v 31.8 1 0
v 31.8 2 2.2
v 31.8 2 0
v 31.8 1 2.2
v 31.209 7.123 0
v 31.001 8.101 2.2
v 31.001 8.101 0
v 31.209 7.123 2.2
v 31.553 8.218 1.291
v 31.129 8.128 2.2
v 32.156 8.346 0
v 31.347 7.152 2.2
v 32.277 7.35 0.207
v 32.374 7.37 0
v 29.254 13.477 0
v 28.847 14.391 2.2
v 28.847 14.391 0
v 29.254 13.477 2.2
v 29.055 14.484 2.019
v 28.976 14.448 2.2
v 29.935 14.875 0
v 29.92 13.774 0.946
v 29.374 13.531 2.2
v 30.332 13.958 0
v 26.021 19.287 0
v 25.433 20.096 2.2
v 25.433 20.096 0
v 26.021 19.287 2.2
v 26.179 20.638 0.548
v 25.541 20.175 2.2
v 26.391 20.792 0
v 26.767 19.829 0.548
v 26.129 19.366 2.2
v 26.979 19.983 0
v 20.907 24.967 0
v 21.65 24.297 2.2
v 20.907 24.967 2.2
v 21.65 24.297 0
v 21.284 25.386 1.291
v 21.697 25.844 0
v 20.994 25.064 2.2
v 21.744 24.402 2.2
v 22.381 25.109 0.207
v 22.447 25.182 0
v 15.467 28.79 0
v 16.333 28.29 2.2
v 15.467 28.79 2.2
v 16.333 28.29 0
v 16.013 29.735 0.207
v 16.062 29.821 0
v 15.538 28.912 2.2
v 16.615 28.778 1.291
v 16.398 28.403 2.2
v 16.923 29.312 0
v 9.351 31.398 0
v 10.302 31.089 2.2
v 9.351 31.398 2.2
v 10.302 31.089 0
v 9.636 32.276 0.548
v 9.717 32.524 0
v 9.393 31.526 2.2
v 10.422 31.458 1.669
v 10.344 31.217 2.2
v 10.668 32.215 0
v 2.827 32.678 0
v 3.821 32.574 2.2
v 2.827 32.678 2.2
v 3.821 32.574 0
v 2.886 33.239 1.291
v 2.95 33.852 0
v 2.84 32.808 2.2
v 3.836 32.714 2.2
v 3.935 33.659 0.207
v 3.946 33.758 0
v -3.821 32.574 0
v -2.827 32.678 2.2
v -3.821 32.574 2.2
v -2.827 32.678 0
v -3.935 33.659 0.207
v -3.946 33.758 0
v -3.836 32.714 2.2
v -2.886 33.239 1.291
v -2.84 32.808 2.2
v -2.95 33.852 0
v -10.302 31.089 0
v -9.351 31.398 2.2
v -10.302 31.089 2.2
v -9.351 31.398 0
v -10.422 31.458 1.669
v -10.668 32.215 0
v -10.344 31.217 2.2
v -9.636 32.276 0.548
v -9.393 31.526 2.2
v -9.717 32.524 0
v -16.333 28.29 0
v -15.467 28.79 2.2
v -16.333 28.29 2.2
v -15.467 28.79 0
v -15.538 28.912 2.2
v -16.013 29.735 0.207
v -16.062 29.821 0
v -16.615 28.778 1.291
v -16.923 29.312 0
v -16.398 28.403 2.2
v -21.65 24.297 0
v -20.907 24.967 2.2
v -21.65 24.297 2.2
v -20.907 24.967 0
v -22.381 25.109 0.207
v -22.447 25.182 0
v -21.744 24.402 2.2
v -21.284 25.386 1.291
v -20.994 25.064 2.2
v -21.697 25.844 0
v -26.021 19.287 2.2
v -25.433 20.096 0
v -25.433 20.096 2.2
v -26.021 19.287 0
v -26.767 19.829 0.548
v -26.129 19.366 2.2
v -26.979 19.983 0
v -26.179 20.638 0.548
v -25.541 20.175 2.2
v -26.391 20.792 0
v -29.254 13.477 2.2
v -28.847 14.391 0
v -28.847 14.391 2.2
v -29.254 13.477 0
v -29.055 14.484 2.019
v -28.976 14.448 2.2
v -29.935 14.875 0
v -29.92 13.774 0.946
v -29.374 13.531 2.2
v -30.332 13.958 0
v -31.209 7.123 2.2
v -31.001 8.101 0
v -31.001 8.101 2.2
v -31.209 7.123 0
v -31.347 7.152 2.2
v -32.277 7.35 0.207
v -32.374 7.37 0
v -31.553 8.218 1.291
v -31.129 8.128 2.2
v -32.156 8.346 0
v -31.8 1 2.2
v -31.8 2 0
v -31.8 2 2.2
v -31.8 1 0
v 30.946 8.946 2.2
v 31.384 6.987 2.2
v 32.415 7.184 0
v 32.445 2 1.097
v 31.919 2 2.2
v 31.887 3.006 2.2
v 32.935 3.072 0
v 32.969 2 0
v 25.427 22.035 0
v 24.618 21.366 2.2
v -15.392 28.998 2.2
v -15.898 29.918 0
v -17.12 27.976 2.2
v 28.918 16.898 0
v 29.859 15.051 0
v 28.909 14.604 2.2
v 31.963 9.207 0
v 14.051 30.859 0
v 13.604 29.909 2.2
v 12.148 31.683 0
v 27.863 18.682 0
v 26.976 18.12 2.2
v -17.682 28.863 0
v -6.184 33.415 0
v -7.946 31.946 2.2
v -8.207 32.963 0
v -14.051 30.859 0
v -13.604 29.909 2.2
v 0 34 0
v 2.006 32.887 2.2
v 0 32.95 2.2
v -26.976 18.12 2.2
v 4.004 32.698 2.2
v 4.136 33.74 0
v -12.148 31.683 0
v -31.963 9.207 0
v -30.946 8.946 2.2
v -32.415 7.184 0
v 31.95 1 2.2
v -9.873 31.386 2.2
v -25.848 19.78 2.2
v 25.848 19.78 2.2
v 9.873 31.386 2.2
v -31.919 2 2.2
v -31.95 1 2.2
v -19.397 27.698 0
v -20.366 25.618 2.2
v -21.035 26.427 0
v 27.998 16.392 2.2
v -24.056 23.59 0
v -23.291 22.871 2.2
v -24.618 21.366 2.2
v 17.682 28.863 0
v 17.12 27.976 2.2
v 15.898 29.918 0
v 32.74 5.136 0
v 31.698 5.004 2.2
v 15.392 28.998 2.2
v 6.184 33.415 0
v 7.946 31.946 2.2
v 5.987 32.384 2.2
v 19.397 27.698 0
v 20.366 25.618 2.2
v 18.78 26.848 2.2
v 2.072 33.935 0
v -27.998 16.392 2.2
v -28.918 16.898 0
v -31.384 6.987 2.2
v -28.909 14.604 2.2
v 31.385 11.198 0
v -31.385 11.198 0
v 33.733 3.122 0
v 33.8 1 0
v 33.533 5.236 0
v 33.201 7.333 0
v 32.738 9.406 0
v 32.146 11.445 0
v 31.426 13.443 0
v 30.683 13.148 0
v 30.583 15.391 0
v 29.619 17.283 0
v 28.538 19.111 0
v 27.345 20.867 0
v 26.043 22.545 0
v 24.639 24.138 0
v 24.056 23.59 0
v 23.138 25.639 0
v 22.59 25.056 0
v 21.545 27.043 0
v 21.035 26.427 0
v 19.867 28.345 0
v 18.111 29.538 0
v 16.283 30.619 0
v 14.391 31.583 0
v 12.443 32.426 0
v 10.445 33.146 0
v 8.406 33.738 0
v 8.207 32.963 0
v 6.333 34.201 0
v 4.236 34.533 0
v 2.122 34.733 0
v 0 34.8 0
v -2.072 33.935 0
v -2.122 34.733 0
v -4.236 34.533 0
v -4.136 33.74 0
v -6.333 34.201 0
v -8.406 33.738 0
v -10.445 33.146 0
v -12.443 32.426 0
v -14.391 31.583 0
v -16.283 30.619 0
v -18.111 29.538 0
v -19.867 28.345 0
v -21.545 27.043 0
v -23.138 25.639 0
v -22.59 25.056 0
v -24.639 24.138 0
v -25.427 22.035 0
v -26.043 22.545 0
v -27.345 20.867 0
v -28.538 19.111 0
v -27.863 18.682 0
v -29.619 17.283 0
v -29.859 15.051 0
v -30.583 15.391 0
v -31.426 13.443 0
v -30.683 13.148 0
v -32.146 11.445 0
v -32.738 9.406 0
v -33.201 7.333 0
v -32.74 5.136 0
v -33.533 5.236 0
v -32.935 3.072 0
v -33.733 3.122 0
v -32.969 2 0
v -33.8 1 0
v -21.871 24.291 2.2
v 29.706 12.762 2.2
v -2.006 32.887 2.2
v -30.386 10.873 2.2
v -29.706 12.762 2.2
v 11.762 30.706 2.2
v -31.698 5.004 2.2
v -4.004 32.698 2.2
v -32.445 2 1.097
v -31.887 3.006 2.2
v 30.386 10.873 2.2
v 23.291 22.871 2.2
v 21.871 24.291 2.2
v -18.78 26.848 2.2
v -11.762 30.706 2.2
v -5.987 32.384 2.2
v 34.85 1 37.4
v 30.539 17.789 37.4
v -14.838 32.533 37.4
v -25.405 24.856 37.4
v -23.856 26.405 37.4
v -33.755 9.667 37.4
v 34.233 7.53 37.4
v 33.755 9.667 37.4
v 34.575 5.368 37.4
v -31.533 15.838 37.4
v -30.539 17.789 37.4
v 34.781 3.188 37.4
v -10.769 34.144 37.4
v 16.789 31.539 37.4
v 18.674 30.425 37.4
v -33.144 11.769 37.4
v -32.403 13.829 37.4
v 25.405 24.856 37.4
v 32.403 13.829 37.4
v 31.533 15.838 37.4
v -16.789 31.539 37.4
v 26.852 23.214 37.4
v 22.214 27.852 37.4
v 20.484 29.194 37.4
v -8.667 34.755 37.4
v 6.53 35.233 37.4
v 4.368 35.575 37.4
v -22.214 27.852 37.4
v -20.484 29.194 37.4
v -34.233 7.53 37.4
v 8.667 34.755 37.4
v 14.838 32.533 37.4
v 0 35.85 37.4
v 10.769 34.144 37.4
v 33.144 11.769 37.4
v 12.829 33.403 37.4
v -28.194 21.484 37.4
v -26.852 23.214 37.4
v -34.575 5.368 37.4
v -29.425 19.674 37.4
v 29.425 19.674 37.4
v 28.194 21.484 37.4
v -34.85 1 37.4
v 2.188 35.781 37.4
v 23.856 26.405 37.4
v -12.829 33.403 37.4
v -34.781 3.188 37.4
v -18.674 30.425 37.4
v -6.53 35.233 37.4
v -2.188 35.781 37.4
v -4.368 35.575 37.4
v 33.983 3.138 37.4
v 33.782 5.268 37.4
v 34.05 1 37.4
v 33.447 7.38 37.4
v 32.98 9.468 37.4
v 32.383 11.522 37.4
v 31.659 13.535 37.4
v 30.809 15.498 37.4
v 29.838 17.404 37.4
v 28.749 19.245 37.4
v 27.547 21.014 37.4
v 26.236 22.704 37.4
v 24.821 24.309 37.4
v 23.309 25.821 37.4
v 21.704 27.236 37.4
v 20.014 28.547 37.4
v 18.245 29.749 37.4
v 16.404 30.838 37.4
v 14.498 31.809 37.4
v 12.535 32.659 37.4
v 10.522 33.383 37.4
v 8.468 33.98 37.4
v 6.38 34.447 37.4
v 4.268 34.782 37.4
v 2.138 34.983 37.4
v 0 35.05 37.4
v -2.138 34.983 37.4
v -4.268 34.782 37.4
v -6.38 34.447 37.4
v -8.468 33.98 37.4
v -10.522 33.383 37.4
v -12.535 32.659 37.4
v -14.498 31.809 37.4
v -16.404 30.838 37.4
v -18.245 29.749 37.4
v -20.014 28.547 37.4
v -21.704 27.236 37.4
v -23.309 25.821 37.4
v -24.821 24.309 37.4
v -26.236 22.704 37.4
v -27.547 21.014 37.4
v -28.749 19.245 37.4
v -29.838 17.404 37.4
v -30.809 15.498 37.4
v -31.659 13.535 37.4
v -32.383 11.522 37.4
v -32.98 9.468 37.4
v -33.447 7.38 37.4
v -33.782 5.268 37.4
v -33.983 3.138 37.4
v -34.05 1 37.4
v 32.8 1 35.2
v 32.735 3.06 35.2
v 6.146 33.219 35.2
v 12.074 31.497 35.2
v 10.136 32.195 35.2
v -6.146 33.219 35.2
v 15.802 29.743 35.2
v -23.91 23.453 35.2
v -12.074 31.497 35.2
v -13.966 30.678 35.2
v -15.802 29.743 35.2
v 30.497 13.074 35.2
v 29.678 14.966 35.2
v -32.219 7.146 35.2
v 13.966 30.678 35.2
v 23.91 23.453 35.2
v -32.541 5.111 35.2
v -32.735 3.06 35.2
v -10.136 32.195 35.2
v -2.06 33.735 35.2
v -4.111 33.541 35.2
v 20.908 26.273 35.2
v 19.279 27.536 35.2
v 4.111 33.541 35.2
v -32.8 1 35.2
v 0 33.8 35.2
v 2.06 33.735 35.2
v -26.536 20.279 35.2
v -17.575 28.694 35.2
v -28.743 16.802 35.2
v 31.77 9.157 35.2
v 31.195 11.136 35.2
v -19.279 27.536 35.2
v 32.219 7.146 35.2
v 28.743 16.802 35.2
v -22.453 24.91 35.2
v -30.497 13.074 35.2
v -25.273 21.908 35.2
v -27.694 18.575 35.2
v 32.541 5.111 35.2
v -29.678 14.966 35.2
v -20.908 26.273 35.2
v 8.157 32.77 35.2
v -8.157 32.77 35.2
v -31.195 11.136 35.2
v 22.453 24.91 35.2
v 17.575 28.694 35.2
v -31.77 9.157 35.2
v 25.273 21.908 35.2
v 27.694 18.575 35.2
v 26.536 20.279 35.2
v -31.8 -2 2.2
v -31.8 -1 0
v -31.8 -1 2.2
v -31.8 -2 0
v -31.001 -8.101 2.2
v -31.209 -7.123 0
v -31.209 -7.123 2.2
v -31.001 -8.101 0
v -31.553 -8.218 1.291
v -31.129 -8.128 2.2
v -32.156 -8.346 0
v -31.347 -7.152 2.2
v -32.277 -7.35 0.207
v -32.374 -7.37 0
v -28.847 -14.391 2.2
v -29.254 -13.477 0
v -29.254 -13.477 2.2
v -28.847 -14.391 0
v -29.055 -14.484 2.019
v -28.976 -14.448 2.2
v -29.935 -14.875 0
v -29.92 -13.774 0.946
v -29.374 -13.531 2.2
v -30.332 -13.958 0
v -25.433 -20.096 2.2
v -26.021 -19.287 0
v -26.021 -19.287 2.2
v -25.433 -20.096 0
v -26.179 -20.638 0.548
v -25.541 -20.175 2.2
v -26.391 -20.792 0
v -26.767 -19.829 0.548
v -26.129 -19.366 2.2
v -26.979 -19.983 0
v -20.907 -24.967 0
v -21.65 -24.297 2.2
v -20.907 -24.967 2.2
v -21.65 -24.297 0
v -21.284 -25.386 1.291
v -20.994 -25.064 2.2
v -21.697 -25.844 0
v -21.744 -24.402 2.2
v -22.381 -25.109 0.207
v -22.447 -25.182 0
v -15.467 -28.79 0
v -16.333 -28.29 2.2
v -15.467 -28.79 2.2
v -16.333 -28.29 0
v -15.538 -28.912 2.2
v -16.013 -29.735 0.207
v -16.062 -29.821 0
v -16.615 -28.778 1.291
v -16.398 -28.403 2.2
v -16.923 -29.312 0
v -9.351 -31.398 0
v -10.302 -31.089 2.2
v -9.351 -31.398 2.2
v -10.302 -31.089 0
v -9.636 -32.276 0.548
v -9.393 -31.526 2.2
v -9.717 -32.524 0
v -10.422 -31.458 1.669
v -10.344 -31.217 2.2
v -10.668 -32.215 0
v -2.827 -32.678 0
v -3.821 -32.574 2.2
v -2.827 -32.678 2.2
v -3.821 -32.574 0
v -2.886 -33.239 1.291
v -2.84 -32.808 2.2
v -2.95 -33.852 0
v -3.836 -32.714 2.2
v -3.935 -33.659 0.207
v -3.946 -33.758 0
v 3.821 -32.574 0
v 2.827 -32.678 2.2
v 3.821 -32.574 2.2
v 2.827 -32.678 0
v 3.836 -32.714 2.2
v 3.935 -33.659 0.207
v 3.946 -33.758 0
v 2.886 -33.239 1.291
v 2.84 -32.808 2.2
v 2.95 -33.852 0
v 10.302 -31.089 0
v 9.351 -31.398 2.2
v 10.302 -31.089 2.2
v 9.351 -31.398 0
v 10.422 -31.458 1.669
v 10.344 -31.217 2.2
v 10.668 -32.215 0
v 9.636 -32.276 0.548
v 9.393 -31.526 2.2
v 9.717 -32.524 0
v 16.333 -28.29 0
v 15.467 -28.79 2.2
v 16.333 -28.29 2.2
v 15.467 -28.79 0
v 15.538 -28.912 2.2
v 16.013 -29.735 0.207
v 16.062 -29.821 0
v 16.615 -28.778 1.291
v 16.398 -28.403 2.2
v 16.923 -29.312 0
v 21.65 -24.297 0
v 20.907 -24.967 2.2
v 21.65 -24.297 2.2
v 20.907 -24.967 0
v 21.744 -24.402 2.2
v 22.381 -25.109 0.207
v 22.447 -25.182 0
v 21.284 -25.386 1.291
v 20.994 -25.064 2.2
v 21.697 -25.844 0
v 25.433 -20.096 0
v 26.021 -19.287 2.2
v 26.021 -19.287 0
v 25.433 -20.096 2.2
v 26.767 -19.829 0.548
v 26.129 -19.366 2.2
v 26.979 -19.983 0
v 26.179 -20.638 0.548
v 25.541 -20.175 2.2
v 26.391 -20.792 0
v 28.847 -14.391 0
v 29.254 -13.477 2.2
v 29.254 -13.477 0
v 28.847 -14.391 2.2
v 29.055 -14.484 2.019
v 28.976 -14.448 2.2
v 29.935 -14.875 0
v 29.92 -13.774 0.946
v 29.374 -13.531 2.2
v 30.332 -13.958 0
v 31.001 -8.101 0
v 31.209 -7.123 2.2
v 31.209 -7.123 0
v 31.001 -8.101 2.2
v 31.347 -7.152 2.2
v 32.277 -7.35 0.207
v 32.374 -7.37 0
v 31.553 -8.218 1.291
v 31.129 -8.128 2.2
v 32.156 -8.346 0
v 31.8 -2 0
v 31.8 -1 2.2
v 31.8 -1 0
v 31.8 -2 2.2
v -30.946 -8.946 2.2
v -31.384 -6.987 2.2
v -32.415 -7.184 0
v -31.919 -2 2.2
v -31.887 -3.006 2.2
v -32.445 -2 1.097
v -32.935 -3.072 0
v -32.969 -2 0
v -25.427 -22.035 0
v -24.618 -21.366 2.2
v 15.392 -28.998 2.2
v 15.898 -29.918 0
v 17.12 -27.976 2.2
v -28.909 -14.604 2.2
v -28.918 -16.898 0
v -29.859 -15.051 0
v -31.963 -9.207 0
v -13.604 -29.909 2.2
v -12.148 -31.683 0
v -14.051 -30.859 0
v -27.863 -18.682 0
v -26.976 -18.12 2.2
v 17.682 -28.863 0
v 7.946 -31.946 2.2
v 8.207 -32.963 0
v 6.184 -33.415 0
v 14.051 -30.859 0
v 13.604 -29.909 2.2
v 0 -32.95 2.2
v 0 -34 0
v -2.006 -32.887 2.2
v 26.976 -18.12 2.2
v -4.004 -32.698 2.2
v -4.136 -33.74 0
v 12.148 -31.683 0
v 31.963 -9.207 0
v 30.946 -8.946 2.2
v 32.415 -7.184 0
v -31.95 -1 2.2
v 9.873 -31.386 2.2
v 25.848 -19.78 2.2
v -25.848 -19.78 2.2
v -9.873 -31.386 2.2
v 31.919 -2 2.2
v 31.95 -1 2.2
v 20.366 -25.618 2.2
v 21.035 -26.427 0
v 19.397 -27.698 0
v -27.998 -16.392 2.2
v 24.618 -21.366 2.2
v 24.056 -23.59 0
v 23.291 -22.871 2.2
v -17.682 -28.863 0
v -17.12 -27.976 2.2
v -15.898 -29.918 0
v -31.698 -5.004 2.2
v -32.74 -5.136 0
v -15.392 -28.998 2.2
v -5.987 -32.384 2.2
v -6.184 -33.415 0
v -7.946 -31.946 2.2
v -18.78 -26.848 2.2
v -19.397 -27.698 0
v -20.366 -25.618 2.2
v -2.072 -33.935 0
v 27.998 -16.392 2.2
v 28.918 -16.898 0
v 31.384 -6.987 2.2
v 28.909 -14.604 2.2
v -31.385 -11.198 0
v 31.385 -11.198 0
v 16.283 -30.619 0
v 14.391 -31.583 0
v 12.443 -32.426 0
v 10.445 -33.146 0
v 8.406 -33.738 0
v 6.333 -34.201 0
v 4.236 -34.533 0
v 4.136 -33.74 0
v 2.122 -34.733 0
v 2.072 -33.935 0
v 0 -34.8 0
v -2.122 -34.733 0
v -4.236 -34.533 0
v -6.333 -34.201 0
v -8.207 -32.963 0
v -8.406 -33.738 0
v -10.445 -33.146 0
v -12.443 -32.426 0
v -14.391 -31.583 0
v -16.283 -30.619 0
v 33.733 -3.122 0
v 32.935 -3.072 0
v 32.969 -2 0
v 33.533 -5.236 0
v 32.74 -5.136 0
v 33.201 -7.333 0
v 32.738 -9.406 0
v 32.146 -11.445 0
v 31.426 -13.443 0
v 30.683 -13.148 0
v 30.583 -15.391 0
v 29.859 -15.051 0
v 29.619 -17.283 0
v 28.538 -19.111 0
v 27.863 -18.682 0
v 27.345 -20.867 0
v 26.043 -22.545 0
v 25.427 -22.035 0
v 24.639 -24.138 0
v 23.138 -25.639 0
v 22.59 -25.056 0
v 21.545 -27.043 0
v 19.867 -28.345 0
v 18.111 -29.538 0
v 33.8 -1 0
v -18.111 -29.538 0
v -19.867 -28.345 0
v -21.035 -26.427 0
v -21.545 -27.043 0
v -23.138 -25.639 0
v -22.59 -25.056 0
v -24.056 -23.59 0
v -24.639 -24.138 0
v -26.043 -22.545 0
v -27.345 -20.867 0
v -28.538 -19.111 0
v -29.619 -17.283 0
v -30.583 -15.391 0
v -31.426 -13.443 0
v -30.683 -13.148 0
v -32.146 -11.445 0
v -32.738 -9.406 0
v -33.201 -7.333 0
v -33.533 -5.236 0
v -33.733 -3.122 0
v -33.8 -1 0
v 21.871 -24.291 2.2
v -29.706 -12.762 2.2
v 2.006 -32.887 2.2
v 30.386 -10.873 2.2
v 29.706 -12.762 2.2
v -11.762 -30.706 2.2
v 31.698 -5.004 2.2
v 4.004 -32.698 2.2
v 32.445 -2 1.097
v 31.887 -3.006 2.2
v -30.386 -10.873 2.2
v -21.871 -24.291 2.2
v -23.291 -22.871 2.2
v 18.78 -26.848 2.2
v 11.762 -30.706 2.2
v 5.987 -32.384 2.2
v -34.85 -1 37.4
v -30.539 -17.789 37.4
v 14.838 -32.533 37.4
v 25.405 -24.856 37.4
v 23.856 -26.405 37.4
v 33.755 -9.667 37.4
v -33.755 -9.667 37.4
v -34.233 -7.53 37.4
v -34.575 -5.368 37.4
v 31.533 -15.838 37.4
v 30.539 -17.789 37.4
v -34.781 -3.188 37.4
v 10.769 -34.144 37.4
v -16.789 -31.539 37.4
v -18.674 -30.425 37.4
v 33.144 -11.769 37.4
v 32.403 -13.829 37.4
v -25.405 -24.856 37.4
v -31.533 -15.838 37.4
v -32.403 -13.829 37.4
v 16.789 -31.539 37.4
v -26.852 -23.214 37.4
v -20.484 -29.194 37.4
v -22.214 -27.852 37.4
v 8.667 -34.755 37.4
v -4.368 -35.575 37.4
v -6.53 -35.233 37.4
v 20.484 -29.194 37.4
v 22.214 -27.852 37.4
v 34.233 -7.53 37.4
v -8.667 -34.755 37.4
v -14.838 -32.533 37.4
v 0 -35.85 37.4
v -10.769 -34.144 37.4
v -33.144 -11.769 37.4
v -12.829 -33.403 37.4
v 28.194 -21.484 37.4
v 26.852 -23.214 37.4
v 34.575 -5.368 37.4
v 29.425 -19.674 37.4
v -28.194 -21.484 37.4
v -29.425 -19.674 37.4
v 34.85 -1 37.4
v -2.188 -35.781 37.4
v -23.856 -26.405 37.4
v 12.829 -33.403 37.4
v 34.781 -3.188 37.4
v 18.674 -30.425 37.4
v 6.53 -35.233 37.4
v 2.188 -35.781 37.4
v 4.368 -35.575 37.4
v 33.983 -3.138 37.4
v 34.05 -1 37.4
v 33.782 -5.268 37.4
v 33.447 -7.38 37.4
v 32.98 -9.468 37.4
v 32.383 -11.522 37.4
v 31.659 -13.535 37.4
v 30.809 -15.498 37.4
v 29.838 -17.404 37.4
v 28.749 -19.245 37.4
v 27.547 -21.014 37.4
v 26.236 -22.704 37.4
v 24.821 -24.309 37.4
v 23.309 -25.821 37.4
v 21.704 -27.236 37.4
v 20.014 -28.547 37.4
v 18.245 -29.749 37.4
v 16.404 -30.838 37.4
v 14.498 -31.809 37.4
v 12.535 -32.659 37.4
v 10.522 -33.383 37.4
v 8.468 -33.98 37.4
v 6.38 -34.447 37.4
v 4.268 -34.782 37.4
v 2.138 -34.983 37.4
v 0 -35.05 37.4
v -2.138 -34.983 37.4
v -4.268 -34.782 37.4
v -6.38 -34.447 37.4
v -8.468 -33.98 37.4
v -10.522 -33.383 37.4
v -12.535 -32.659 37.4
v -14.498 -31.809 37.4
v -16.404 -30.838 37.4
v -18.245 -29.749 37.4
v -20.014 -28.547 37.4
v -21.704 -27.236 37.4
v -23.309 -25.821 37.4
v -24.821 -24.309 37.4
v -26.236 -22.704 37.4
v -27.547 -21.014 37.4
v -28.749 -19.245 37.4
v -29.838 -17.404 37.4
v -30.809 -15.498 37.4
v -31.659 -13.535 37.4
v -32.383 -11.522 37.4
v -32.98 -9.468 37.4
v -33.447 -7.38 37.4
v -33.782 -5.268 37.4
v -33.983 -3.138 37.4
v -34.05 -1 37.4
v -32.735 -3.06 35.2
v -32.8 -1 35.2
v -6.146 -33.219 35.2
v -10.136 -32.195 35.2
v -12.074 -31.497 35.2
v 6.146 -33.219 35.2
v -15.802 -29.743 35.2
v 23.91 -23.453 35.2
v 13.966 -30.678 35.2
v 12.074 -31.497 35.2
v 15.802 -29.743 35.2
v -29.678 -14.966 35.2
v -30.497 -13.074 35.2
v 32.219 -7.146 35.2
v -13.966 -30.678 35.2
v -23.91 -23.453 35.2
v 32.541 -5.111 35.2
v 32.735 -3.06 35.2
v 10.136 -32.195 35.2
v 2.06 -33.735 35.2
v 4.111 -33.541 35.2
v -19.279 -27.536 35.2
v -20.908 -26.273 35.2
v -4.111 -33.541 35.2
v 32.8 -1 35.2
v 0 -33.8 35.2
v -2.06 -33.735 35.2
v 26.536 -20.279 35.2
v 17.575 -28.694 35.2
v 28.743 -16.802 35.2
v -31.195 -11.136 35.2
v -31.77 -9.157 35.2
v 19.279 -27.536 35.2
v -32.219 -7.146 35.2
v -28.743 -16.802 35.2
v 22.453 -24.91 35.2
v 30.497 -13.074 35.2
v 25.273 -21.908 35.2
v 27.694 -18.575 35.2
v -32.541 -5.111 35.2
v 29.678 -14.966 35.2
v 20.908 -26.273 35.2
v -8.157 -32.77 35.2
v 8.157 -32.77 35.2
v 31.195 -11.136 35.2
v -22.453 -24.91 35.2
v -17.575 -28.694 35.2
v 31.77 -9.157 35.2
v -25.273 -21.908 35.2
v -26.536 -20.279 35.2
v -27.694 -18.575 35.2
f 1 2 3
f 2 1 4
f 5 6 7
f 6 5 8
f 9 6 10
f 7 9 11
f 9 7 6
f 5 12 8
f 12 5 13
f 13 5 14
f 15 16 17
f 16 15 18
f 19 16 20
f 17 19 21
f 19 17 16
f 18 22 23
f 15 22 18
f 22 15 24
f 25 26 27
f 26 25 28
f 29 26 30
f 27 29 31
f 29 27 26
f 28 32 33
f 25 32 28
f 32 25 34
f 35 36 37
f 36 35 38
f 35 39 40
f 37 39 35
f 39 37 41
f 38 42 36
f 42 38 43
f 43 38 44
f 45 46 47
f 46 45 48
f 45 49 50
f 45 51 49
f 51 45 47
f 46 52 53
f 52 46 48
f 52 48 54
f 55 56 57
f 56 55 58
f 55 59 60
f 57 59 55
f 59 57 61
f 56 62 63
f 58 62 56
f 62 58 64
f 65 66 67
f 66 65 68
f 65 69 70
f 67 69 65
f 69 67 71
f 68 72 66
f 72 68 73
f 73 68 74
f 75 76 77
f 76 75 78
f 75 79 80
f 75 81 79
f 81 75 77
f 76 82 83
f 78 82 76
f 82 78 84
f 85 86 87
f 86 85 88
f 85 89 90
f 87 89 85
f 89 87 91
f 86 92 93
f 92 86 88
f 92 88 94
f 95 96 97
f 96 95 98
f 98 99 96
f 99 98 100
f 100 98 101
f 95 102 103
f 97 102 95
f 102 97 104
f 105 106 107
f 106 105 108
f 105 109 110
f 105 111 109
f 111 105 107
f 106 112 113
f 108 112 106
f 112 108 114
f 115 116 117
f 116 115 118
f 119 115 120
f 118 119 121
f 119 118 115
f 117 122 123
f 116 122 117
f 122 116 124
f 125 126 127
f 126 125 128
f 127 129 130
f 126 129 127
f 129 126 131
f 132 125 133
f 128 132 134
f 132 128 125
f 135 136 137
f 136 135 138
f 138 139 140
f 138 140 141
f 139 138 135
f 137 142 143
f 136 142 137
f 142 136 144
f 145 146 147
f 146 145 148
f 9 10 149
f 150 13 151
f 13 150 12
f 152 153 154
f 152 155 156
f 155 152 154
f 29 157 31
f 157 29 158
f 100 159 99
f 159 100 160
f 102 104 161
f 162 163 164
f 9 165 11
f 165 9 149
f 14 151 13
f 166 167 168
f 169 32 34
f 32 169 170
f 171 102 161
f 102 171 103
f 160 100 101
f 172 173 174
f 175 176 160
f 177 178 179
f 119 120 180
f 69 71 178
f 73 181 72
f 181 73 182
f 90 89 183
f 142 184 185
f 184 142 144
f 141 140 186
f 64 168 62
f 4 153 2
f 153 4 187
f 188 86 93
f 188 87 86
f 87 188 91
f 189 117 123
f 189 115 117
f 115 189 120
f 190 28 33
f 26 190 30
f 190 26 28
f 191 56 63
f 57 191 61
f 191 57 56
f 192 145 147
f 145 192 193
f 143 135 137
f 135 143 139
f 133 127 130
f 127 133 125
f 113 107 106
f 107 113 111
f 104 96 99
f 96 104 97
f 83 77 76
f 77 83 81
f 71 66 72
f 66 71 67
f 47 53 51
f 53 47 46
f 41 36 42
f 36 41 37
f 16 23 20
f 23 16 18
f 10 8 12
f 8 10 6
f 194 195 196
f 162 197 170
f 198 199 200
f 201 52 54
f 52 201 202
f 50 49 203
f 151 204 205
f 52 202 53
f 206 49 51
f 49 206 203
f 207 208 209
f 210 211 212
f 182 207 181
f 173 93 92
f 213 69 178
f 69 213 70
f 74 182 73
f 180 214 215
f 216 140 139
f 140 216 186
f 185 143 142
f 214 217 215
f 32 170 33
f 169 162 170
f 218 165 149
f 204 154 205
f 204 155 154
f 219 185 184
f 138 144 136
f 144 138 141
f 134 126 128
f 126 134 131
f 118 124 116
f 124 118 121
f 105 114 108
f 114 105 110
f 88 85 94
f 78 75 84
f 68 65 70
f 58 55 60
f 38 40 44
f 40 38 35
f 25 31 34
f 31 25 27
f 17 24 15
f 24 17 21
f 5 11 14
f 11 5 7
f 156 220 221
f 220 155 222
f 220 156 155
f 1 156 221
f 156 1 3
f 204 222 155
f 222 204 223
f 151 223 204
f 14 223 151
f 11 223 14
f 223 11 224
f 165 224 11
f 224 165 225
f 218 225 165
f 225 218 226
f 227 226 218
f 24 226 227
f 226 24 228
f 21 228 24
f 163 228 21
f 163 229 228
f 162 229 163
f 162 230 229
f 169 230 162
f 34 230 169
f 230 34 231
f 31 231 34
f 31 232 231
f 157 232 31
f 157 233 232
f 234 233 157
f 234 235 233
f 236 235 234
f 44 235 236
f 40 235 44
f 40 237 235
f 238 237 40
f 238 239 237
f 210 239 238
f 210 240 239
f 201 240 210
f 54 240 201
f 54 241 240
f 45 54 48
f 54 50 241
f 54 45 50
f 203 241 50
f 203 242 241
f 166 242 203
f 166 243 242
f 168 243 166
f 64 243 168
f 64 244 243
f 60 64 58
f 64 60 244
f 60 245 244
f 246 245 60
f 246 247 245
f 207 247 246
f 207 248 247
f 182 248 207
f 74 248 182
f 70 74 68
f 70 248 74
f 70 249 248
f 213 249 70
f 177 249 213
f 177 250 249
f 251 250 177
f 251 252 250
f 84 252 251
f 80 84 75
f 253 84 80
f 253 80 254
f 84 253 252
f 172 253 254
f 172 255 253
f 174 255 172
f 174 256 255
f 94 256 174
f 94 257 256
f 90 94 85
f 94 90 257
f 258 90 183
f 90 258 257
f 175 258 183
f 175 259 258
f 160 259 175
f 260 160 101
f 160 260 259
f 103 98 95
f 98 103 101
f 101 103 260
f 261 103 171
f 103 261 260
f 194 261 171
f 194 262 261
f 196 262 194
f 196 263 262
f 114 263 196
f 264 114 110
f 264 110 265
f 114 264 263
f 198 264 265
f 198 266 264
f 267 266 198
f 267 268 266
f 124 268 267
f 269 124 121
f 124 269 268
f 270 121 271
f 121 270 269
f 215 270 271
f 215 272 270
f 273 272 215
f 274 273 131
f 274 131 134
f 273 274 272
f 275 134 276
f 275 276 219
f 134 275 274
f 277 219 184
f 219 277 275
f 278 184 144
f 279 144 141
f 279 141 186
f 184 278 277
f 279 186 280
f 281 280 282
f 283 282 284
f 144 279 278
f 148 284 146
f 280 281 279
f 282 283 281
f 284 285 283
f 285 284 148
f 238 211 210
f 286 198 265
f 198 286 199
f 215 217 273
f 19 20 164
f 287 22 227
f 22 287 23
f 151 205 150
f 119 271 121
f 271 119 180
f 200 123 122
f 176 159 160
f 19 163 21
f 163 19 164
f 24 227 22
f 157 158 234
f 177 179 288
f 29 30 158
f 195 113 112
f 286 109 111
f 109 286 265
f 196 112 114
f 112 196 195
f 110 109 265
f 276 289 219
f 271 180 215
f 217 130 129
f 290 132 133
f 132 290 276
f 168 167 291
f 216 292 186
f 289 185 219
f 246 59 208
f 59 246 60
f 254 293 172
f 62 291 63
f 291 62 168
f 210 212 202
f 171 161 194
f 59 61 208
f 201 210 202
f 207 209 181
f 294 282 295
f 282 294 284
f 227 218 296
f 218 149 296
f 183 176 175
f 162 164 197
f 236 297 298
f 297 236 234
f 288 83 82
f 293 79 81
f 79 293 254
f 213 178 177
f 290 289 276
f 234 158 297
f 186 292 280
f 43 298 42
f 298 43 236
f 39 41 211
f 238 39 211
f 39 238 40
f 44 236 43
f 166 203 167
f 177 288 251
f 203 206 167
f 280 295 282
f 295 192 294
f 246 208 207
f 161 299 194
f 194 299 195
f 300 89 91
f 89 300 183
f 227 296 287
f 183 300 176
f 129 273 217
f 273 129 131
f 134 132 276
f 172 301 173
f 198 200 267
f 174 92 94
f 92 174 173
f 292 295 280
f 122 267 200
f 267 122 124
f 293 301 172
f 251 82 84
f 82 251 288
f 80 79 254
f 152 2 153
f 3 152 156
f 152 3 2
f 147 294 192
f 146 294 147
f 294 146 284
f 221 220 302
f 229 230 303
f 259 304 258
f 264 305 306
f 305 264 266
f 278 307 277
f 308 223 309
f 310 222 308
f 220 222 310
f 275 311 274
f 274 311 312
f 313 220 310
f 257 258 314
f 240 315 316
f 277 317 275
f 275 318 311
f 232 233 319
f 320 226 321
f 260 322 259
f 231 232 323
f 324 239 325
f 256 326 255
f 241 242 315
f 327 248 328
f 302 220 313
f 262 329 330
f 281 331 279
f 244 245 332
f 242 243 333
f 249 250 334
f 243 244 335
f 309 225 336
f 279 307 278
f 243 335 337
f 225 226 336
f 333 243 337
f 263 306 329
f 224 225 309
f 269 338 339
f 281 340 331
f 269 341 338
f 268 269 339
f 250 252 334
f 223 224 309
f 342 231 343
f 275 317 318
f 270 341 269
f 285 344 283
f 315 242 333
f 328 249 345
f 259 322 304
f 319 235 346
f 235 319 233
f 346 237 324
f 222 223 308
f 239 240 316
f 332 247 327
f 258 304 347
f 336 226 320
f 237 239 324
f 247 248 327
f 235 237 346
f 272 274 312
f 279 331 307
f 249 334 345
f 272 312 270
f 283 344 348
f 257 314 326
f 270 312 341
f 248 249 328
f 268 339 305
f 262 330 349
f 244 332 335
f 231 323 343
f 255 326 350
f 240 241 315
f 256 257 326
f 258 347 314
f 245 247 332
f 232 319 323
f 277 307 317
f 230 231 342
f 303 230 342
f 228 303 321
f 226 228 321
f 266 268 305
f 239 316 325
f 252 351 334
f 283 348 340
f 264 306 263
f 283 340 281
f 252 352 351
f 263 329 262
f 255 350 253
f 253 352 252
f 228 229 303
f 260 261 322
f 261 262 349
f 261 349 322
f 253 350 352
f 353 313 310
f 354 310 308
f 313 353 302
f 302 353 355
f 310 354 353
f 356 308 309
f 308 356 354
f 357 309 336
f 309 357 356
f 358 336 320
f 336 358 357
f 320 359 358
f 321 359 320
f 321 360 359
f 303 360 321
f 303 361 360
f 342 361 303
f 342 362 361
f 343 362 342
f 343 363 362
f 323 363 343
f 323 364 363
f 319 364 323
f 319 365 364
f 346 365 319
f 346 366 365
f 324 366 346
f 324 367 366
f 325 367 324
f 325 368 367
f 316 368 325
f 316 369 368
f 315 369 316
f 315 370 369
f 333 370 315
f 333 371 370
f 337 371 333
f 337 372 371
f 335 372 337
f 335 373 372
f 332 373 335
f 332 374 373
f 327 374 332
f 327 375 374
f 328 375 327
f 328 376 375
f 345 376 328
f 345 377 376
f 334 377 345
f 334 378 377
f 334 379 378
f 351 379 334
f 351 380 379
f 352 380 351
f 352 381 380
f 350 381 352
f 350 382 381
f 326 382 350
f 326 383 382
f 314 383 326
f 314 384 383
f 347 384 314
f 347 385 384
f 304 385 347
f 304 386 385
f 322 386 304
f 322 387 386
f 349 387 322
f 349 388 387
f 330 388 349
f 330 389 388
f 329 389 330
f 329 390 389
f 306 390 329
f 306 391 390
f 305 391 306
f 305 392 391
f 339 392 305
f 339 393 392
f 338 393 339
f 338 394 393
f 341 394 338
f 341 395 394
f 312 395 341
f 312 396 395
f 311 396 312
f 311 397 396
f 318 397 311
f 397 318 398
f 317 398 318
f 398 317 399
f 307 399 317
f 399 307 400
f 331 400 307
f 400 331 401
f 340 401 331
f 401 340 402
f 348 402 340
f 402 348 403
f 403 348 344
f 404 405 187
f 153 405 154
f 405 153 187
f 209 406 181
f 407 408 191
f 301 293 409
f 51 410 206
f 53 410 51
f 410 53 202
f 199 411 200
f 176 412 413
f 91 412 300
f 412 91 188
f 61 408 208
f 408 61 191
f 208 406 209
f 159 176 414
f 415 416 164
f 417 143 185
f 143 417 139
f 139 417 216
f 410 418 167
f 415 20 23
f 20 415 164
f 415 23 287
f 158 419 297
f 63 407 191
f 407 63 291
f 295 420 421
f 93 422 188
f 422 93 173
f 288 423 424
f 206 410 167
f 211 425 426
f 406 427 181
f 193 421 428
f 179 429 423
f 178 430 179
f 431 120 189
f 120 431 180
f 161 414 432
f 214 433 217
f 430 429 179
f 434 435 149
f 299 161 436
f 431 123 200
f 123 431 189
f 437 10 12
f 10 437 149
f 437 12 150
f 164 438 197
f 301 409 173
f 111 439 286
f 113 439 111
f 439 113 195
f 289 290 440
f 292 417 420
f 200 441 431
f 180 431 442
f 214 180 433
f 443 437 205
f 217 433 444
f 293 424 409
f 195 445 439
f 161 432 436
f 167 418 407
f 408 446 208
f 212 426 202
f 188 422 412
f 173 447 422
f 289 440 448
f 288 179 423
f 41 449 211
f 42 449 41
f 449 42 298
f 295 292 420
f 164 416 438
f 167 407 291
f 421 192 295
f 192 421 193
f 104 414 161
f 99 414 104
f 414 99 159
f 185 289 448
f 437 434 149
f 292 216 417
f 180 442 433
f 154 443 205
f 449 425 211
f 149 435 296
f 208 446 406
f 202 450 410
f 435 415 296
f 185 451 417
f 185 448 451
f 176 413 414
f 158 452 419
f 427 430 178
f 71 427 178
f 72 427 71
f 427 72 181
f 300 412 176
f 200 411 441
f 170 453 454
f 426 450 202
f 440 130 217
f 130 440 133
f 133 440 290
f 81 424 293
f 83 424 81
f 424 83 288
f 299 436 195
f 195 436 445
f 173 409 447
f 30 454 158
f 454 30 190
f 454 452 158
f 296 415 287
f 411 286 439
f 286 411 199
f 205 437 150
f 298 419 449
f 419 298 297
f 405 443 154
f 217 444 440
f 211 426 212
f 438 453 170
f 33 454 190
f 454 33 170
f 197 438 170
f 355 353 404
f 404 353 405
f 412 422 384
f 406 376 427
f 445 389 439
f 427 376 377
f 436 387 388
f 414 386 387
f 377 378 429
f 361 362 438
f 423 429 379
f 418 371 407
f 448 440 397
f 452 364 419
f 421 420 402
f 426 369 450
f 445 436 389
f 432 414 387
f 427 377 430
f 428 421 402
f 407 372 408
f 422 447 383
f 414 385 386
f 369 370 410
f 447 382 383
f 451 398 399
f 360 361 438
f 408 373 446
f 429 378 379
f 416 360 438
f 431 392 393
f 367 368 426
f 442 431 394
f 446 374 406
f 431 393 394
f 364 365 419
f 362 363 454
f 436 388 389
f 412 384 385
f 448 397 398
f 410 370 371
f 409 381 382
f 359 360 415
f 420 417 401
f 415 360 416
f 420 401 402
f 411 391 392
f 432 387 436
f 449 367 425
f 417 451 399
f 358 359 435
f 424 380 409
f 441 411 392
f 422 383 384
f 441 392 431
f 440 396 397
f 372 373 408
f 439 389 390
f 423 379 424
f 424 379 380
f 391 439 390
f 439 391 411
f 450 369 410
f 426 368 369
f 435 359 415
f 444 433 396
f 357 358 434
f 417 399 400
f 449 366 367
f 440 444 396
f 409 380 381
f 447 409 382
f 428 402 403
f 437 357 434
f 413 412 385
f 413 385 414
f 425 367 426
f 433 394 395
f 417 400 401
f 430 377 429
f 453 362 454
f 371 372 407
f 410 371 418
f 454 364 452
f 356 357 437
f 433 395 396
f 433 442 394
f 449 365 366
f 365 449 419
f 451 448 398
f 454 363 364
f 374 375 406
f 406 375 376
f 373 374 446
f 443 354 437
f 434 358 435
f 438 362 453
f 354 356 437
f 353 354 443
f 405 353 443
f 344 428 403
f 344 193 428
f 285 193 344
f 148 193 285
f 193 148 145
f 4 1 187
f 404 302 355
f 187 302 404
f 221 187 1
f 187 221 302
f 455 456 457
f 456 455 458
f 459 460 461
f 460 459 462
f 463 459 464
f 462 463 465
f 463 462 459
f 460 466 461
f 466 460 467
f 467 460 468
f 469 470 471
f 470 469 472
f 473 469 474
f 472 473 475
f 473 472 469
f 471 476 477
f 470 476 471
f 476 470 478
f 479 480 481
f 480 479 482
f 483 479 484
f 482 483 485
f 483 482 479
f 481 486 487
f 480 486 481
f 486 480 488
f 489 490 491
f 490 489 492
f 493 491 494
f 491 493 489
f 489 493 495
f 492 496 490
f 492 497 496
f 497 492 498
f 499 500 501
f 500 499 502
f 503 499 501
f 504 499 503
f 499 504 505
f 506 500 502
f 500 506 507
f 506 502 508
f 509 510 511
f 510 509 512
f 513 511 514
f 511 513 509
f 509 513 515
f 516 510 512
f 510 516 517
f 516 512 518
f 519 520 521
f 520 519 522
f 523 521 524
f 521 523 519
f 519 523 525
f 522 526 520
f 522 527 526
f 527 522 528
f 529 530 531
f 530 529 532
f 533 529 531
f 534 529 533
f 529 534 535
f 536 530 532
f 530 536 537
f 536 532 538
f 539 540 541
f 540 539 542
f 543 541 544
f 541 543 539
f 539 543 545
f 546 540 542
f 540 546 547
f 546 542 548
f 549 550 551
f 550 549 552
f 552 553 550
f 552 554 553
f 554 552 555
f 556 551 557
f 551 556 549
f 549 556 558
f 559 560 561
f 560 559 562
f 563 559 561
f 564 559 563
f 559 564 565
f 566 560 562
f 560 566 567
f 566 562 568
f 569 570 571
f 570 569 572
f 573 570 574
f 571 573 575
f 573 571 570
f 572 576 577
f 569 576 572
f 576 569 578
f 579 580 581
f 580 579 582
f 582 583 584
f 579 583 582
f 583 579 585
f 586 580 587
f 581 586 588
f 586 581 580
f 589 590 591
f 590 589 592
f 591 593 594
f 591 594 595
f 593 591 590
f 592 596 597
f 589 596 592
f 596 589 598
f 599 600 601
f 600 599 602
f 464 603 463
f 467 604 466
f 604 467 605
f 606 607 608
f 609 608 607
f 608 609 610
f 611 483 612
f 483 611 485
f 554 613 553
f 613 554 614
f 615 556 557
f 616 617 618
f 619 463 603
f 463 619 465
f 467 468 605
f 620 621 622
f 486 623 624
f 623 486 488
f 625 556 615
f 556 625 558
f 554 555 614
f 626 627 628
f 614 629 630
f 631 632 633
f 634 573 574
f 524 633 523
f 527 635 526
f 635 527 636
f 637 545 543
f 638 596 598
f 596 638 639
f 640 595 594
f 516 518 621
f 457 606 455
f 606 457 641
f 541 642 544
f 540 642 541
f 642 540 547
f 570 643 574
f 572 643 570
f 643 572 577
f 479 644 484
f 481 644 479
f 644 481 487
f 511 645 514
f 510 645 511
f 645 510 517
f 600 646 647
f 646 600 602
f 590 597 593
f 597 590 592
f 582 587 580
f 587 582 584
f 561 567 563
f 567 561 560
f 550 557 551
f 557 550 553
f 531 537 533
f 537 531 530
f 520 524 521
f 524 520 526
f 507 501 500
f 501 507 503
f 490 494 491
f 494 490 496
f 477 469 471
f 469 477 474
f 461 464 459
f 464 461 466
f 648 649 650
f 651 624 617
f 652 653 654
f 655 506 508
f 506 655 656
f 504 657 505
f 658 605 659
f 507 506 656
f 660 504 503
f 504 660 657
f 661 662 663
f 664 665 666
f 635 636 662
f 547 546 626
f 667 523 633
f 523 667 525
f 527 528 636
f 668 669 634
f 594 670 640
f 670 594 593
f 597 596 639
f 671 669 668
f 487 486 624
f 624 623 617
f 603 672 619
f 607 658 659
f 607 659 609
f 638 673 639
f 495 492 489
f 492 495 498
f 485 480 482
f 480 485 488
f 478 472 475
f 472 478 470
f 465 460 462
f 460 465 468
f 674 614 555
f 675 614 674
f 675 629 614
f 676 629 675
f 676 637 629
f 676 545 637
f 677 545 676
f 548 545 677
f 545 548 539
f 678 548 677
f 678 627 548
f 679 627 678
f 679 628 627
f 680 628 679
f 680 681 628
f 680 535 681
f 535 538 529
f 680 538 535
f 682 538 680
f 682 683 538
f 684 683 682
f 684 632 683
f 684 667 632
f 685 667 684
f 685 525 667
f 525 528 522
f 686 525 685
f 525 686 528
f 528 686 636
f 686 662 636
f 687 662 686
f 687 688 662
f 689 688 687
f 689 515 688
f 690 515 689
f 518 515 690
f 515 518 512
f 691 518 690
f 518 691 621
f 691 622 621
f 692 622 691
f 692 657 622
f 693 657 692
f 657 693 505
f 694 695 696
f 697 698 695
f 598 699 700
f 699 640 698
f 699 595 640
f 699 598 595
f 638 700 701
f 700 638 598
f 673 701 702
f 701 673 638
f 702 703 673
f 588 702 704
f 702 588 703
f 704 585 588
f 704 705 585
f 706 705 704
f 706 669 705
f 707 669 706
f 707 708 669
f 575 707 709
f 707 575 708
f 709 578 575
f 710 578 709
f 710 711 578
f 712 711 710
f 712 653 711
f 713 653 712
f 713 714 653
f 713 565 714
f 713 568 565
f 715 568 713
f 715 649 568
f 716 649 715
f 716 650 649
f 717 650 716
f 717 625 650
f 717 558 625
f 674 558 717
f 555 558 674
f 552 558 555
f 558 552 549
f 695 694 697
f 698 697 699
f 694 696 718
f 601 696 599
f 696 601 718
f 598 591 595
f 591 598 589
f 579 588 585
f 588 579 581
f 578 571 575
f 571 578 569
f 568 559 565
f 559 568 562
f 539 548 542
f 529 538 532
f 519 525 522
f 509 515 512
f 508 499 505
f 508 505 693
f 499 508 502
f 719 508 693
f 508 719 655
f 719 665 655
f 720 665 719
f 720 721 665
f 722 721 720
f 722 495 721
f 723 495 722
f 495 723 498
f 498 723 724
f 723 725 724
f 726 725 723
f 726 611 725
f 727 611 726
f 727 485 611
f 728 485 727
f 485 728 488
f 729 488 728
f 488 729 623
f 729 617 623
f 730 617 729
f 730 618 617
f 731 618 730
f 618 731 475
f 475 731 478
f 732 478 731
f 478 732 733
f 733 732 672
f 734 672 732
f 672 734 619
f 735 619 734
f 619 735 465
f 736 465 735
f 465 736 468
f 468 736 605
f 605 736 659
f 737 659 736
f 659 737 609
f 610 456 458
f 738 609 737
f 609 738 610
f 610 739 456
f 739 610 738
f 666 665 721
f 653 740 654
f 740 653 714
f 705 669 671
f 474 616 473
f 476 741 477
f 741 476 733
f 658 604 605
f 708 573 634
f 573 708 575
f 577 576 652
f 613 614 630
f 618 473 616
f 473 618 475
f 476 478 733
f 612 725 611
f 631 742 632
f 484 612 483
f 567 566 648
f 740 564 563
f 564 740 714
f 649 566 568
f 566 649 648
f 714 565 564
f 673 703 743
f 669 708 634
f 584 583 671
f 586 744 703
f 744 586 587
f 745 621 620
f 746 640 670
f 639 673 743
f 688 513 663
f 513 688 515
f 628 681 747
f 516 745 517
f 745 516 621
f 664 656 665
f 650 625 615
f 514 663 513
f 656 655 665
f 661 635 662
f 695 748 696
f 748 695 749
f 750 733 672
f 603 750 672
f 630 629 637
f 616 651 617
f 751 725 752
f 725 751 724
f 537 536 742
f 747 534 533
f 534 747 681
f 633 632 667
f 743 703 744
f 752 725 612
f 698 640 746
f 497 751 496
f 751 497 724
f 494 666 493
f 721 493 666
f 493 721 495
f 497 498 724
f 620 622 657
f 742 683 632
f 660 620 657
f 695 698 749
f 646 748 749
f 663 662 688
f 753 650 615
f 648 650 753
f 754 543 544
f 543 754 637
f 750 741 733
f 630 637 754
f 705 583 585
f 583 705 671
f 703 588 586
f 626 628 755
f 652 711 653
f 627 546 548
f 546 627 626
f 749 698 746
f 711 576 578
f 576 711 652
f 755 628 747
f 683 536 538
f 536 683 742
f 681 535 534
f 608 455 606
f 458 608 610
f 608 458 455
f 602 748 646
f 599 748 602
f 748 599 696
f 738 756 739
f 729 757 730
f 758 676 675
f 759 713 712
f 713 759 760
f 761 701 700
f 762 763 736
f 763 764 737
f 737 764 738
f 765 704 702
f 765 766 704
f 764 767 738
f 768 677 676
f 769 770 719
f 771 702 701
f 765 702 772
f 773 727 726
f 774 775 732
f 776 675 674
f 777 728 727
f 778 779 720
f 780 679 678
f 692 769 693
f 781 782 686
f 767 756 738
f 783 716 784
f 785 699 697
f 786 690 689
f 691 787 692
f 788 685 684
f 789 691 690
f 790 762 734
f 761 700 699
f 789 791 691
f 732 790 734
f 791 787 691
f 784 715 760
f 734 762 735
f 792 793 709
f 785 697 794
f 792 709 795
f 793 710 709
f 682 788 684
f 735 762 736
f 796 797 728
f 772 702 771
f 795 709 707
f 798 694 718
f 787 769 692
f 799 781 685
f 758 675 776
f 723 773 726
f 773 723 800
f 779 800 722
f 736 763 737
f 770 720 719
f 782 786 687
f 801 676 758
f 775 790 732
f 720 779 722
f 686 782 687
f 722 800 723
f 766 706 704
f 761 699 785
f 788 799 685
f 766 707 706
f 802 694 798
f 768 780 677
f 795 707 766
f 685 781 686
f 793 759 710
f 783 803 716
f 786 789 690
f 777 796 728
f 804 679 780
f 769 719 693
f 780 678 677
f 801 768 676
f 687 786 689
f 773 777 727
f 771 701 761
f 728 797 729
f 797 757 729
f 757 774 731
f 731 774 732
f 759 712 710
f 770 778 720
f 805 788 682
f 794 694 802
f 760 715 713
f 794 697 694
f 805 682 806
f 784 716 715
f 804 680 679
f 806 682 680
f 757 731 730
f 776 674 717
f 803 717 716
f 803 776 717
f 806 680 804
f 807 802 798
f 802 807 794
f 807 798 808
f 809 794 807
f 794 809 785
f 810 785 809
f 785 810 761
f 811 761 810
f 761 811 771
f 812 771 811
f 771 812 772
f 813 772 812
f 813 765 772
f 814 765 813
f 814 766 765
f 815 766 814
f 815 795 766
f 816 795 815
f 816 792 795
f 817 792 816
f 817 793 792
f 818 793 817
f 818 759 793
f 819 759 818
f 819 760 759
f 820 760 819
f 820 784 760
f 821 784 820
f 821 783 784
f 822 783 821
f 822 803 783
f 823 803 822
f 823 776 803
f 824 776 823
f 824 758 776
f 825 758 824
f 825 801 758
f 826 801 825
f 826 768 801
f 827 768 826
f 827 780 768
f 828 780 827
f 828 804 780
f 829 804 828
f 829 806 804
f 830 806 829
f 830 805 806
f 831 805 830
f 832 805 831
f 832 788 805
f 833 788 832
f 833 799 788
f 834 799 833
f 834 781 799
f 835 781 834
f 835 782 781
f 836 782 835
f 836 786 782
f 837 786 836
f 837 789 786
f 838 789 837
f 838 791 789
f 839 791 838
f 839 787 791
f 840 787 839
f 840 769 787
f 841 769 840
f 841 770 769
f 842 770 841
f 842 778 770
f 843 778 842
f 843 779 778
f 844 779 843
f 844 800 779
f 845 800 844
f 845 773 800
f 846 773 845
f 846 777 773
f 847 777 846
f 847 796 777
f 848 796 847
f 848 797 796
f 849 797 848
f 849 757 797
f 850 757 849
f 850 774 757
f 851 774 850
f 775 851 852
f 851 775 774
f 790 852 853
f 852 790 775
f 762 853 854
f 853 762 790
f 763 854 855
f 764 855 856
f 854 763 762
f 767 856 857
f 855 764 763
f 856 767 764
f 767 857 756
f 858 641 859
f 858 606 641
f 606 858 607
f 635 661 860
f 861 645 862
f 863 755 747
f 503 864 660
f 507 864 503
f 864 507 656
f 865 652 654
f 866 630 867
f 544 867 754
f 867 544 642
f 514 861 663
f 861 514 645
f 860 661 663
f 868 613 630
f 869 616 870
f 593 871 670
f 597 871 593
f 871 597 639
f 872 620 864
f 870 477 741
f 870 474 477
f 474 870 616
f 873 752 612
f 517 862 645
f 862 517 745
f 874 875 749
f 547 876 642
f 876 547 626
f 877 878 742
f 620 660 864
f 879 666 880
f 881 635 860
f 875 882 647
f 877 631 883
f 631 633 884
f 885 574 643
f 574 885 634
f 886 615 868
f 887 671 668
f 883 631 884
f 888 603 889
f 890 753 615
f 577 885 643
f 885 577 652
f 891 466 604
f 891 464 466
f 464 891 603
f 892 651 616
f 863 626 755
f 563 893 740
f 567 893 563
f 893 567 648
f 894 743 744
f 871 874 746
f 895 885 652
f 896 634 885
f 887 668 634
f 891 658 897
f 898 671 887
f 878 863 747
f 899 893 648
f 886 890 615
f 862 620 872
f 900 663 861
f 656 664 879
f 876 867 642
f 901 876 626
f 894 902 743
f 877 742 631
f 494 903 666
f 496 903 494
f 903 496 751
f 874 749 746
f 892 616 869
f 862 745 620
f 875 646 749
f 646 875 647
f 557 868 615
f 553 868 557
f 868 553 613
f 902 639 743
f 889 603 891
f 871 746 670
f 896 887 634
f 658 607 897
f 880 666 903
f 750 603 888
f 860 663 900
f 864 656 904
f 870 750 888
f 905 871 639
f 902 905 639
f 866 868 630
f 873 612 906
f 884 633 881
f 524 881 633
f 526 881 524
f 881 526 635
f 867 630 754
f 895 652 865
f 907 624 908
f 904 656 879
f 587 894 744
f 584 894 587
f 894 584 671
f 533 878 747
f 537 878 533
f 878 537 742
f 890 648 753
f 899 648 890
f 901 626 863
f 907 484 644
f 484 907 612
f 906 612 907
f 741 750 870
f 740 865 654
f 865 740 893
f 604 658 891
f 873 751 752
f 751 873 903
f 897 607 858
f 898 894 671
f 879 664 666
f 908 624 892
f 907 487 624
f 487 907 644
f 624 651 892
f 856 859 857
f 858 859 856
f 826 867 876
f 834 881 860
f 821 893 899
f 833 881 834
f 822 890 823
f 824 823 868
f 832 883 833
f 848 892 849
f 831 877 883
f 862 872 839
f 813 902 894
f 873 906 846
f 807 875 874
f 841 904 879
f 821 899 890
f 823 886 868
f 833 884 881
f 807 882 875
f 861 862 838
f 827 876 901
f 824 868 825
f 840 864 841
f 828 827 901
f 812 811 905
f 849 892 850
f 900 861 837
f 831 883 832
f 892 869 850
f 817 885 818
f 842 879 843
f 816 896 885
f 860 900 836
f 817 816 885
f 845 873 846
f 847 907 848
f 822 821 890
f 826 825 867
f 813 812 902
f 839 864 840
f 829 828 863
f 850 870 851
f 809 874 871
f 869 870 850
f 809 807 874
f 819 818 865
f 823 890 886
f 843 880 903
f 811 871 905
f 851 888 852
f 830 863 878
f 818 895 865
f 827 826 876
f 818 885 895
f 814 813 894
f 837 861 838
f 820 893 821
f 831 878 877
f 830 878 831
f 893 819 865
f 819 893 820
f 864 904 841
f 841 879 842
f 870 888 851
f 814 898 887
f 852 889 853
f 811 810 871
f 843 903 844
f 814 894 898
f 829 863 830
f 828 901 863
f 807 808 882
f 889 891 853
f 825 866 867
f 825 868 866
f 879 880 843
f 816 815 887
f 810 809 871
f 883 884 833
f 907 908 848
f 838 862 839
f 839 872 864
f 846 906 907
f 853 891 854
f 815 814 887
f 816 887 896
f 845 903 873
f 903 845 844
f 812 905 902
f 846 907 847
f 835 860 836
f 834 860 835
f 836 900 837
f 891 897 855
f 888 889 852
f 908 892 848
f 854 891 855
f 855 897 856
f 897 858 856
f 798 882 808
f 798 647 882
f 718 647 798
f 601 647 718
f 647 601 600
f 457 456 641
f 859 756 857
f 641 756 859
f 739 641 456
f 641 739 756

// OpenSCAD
// file: spool_backing.scad
th_in=1.5;
th_out=1.5;

s_w=1;
s_n=15;

p_w=0.8;

$fn=100;

module support_diff(d1=30,d2=28,d3=38,d4=40,h1=20,h2=25){
    ds_in_max=d1+(th_in*2);
    ds_in_min=d2+(th_in*2);
    hs_in=h2+th_out;
    ds_out_max=d4-(th_out*2);
    ds_out_min=d3-(th_out*2);
    hs_out=h2;
    union(){
    difference(){
        cylinder(r1=ds_out_max/2, r2=ds_out_min/2, h=hs_out);
        translate([0,0,(hs_out-hs_in)/2])cylinder(r1=ds_in_max/2, r2=ds_in_min/2, h=hs_in);
        for(ang=[0:360/(s_n*2):360]){
            rotate([0,0,ang])translate([(d2/2)-1,-s_w/2,-1])cube([20,s_w,h2+2]);
        }
        translate([-d4,-s_w,0])cube([d4*2,s_w*2,hs_out]);
}
}
}

module stand(d1=30,d2=28,d3=38,d4=40,h1=20,h2=25, ss_w=1){
    difference(){
        translate([0,0,0])cylinder(r1=d4/2-p_w, r2=d1/2, h=(h2-h1)/2);
        for(ang=[0:360/(s_n*2):360]){
            rotate([0,0,ang])translate([(d2/2)-1,-ss_w/2,-1])cube([3,ss_w,h2+2]);
        }
        translate([(d2/2)-1,-ss_w,-1])cube([3,ss_w,h2+2]);
        translate([(d2/2)-1,0,-1])cube([3,ss_w,h2+2]);
        translate([-(d2/2+3)+1,-ss_w,-1])cube([3,ss_w,h2+2]);
        translate([-(d2/2+3)+1,0,-1])cube([3,ss_w,h2+2]);
    }
    }


module spool_backing(d1=30,d2=28,d3=38,d4=40,h1=20,h2=25, support=true, stand=false){
    h_delta=(h2-h1)/2;
    difference(){
        cylinder(r1=d4/2, r2=d3/2, h=h2);
        translate([0,0,h_delta])cylinder(r1=d1/2, r2=d2/2, h=h1);
        translate([0,0,h1+h_delta])cylinder(r1=d2/2, r2=d3/2-p_w, h=(h2-h1)/2);
        
        if(support){
            support_diff(d1=d1,d2=d2,d3=d3,d4=d4,h1=h1,h2=h2);
        }
        translate([-d4,-d4,-1])cube([d4*2,d4,h2*2]);
    if(stand){
        //for(st_a=[5:34:175]){
        //    rotate([0,0,st_a])translate([d1/2,-p_w/2,0])cube([(d4-d1)/2-p_w,p_w,1]);
        //}
        stand(d1=d1,d2=d2,d3=d3,d4=d4,h1=h1,h2=h2);
    }else{
        translate([0,0,0])cylinder(r1=d4/2-p_w, r2=d1/2, h=(h2-h1)/2);
        //support();
    }
}
}

//spool_backing(stand=true);
stand();
// main file
model="Daiwa Emblem Spod 0.16-300";
d1 = 63.9;
d2 = 65.6;
h1 = 33;

d4 = 67.6;
d3 = 69.7;
h2 = 37.4;

use <spool_backing.scad>

translate([0,1,0])spool_backing(d1=d1,d2=d2,d3=d3,d4=d4,h1=h1,h2=h2,stand=true);
translate([0,-1,0])rotate([0,0,180])spool_backing(d1=d1,d2=d2,d3=d3,d4=d4,h1=h1,h2=h2,stand=true);
